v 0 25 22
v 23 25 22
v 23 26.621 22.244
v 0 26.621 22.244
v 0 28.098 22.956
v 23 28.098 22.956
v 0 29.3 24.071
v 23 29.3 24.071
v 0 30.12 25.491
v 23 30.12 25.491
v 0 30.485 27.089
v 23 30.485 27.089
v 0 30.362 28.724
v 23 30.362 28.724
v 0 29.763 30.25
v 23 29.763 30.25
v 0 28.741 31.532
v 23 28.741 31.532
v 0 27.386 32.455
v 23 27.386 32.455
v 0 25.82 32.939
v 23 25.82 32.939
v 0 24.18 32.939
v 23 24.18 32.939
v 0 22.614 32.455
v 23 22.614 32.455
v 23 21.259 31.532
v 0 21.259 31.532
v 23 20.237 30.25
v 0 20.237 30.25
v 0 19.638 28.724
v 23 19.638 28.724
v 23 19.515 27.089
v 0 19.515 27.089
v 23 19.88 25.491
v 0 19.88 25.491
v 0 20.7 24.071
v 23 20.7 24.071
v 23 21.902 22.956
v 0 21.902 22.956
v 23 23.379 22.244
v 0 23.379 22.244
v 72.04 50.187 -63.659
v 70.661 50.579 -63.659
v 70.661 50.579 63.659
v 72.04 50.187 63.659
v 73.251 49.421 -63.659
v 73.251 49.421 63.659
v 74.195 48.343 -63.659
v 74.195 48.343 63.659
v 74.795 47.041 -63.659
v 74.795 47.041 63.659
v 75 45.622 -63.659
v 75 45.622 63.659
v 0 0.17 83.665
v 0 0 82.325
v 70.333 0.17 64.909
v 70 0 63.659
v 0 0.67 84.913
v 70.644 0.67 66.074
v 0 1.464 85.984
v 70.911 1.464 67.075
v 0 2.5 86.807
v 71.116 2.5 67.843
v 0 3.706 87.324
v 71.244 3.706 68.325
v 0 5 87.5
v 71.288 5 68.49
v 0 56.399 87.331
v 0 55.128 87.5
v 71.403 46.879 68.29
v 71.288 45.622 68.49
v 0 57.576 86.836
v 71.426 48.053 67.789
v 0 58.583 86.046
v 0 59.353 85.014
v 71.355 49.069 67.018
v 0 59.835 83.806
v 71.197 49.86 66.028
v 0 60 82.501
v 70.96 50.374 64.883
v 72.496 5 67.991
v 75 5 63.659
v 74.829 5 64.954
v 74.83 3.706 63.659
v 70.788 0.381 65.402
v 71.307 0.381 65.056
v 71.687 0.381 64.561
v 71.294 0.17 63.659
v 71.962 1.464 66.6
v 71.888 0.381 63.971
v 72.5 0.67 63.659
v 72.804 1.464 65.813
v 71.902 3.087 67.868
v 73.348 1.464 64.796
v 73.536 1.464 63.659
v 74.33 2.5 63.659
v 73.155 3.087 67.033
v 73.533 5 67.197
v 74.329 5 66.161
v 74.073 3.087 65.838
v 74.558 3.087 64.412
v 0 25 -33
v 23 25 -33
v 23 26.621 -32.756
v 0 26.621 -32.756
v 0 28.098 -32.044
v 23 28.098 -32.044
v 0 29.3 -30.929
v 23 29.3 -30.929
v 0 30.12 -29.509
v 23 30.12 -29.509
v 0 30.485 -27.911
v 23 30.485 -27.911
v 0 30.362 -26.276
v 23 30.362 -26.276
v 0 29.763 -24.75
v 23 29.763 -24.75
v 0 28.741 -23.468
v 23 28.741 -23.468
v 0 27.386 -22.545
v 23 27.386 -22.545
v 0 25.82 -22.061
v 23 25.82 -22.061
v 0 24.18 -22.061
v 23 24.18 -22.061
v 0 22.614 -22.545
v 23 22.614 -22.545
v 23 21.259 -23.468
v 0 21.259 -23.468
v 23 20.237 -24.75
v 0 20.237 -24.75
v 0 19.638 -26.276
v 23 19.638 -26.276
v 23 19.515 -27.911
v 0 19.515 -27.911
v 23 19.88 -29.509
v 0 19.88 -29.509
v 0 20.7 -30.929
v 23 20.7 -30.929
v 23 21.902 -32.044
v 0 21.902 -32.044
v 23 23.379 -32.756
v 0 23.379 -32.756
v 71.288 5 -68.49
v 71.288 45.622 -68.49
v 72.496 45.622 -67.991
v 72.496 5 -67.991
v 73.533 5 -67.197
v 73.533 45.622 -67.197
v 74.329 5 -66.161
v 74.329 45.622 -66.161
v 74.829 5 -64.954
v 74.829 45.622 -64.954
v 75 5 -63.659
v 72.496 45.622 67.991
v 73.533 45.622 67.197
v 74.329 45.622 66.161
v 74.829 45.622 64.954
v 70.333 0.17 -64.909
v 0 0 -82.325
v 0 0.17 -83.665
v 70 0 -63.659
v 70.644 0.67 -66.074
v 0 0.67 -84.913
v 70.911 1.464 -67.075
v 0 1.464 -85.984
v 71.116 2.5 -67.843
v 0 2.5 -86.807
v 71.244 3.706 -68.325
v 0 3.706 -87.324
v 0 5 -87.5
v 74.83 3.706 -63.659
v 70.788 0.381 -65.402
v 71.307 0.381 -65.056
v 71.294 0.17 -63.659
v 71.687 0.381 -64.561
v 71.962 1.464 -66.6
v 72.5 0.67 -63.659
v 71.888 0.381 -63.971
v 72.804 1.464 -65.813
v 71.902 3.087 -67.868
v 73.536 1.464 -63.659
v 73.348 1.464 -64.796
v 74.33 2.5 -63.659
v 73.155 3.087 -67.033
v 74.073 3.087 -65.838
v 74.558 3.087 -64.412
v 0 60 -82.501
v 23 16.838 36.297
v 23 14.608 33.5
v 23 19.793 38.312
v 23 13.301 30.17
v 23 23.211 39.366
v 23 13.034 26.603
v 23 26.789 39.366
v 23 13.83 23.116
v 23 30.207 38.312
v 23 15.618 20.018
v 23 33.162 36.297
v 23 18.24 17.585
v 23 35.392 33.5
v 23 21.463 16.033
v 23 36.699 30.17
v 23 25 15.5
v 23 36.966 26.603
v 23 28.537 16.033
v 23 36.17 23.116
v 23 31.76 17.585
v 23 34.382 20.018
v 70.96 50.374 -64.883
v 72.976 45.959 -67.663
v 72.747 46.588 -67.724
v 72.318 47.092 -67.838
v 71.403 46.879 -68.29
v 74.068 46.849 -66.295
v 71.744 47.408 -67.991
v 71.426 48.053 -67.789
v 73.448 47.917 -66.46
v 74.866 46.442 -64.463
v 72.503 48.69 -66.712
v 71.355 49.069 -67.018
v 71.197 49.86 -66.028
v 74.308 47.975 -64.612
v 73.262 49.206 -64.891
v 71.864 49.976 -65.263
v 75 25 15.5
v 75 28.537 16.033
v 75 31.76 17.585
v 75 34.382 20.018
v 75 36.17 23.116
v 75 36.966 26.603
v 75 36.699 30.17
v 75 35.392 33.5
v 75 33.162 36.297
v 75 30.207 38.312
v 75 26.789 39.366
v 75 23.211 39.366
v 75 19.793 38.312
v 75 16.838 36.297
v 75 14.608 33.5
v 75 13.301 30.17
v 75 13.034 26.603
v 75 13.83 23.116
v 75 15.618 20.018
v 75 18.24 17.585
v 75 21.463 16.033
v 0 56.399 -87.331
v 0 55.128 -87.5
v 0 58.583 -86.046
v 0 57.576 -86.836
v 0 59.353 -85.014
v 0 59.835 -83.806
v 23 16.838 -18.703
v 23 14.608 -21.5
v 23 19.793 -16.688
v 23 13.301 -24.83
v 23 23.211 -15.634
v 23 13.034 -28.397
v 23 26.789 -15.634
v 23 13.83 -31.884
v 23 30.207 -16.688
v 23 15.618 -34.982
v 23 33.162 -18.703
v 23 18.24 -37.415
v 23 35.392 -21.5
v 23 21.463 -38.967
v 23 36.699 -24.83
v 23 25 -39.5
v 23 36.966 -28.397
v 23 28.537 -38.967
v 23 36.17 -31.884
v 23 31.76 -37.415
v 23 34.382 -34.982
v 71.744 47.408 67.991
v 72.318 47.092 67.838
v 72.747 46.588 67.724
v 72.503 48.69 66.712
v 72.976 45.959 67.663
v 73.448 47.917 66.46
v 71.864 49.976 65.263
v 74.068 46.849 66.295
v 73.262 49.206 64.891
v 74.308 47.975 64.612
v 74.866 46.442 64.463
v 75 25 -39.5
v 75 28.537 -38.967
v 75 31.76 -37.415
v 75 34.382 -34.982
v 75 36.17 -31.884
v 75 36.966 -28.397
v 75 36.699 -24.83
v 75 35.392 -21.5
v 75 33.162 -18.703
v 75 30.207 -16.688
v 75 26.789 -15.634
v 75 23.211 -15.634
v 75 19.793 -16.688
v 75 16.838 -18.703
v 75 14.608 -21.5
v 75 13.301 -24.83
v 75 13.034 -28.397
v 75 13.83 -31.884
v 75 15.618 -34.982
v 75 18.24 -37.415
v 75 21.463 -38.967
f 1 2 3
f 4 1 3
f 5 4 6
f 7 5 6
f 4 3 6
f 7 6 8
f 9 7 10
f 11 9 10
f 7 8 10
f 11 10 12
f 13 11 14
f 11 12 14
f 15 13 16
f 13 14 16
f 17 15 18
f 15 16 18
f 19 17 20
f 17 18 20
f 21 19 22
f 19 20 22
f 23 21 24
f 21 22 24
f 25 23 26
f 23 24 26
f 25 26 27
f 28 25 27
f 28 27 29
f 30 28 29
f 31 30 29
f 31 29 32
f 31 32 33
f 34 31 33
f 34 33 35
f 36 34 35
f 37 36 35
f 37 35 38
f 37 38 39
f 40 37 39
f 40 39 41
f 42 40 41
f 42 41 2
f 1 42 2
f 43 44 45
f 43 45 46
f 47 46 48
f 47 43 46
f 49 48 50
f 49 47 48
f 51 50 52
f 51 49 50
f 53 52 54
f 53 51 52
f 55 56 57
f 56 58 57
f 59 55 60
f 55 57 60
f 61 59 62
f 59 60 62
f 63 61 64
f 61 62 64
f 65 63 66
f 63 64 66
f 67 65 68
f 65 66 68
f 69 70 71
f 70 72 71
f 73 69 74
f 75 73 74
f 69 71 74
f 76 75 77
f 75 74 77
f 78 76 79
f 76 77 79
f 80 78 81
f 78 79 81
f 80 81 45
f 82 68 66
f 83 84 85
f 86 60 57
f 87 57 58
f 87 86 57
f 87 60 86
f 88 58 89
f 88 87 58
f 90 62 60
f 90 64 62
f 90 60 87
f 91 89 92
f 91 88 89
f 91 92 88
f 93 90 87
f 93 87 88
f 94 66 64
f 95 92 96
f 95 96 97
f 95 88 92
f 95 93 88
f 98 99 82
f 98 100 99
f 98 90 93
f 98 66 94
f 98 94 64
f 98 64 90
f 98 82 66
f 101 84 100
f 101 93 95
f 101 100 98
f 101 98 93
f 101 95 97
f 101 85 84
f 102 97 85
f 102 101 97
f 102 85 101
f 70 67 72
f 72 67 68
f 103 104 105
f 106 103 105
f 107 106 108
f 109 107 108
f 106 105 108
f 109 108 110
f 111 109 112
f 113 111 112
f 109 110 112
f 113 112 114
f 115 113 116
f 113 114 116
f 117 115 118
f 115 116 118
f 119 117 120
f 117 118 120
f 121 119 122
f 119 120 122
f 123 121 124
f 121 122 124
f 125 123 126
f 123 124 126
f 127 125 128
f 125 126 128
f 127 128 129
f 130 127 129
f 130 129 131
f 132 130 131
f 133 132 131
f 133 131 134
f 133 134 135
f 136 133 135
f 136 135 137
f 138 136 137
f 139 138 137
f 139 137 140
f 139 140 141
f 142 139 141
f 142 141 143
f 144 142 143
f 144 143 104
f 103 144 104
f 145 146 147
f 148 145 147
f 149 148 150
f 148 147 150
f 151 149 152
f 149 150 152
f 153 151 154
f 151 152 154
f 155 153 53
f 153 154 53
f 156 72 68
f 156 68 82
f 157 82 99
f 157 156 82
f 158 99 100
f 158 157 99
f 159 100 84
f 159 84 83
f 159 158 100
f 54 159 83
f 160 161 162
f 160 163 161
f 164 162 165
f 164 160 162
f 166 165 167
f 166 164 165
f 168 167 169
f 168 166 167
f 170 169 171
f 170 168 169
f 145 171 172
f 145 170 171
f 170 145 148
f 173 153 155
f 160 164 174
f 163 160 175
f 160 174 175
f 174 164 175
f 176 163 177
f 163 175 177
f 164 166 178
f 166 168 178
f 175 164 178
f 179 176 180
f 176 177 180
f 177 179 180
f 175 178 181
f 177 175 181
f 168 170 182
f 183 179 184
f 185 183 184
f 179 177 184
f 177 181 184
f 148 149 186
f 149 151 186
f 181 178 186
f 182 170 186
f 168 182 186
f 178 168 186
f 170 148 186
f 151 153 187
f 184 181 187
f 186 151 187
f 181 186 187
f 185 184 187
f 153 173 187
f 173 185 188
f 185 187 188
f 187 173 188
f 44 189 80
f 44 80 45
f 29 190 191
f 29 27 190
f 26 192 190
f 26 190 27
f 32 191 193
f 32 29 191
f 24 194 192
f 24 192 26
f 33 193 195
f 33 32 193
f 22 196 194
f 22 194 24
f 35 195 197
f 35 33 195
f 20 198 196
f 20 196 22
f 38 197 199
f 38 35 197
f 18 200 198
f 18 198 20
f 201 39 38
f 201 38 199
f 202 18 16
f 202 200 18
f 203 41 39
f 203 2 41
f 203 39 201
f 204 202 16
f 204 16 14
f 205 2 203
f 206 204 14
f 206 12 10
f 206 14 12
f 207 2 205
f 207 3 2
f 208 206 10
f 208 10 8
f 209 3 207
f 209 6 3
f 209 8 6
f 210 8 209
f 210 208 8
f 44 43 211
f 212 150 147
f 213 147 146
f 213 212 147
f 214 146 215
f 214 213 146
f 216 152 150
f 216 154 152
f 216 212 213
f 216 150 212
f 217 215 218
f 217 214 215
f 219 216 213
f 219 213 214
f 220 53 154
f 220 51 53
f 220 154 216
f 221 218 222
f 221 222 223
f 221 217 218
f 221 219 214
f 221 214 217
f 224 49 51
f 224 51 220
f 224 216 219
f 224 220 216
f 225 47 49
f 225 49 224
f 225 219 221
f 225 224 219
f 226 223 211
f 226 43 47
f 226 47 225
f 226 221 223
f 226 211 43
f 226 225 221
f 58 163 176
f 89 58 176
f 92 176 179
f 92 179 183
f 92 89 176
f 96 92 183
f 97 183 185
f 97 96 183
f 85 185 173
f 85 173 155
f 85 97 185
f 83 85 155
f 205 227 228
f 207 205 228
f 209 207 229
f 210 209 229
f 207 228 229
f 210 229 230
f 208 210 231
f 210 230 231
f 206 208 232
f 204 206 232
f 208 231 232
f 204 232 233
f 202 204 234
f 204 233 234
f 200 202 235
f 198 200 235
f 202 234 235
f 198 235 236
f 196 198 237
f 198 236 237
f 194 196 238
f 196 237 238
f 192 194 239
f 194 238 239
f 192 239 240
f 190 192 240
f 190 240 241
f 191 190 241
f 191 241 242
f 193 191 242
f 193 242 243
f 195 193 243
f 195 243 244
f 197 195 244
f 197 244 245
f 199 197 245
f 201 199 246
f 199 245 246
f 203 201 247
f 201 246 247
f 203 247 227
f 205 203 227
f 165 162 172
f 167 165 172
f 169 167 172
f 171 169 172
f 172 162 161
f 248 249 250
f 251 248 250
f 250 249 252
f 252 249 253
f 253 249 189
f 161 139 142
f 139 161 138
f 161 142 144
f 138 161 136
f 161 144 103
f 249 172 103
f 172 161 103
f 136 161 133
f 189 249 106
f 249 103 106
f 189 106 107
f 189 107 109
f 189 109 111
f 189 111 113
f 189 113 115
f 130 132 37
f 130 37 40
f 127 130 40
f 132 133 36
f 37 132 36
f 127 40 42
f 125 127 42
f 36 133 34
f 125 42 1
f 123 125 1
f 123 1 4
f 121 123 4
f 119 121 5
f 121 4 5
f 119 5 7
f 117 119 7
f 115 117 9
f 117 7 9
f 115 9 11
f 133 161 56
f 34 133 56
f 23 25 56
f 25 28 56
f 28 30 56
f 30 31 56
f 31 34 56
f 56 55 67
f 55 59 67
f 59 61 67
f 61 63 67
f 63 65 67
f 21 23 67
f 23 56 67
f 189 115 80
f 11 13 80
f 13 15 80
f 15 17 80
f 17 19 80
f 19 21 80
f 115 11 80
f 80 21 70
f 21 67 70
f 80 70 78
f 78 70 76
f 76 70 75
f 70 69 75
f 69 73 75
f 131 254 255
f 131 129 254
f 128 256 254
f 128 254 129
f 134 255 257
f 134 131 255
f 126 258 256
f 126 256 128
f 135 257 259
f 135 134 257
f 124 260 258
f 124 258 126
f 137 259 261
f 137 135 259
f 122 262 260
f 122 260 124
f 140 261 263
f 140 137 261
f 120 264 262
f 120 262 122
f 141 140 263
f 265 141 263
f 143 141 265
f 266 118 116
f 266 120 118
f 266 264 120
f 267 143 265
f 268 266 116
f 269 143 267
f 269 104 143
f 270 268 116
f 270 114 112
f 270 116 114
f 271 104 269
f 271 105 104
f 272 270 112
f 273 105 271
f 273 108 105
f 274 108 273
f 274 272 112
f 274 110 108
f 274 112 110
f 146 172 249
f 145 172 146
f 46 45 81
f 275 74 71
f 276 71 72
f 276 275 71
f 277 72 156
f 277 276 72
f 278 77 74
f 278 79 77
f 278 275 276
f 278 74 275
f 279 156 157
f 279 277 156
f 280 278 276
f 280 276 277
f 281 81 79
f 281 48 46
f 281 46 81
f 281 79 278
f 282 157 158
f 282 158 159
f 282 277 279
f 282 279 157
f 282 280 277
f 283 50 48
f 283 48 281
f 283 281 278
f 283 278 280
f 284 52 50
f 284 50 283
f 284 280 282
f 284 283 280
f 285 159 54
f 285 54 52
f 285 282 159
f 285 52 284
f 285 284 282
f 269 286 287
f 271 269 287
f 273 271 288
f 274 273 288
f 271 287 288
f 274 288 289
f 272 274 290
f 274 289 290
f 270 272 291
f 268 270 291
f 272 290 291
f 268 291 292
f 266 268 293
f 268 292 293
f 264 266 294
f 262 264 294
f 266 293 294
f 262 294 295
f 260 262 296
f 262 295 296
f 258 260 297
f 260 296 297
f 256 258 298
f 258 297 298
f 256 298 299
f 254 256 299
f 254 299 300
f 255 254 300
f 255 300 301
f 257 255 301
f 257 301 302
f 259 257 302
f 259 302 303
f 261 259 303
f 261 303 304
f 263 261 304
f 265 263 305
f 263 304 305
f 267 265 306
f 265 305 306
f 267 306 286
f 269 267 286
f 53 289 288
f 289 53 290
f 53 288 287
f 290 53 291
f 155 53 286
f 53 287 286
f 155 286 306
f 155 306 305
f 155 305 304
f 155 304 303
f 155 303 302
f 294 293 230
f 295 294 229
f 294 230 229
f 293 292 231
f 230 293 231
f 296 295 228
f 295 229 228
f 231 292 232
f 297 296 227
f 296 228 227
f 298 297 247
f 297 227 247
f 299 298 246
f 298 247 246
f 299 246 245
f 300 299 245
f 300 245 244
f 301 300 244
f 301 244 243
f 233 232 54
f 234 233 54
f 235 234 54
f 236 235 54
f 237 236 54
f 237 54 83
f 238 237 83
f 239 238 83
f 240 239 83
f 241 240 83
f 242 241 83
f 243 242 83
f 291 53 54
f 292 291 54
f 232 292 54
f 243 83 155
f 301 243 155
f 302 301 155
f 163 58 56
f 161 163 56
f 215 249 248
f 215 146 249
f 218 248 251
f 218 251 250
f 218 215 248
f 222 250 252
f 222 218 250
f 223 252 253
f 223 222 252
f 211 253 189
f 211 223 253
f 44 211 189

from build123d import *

# Parameters (mm, degrees)
EXTRUDE_1_DEPTH     = 87.5
CUT_EXTRUDE_1_DEPTH = 175
SKETCH_3_R          = 12
CUT_EXTRUDE_2_DEPTH = 52
SKETCH_4_R          = 5.5
CUT_EXTRUDE_3_DEPTH = 40
FILLET_1_R          = 5


with BuildPart() as part:
    # 草图1 → 凸台-拉伸1 (new, symmetric)
    with BuildSketch(Plane.XY):
        Polygon((0, 0), (0, 60), (75, 50), (75, 0), align=None)
    extrude(amount=EXTRUDE_1_DEPTH, both=True)

    # 草图2 → 切除-拉伸1 (cut)
    with BuildSketch(Plane.XZ):
        Polygon((0, 87.5), (75, 67.5), (75, 87.5), align=None)
        Polygon((0, -87.5), (75, -67.5), (75, -87.5), align=None)
    extrude(amount=-CUT_EXTRUDE_1_DEPTH, mode=Mode.SUBTRACT)

    # 草图3 → 切除-拉伸2 (cut)
    with BuildSketch(Plane(origin=(75, 0, 0), x_dir=(0, 0, -1), z_dir=(1, 0, 0))):
        with Locations((-27.5, 25)):
            Circle(SKETCH_3_R)
        with Locations((27.5, 25)):
            Circle(SKETCH_3_R)
    extrude(amount=-CUT_EXTRUDE_2_DEPTH, mode=Mode.SUBTRACT)

    # 草图4 → 切除-拉伸3 (cut)
    with BuildSketch(Plane(origin=(23, 0, 0), x_dir=(0, 0, -1), z_dir=(1, 0, 0))):
        with Locations((-27.5, 25)):
            Circle(SKETCH_4_R)
        with Locations((27.5, 25)):
            Circle(SKETCH_4_R)
    extrude(amount=-CUT_EXTRUDE_3_DEPTH, mode=Mode.SUBTRACT)

    # 圆角1
    fillet_1_edges = [part.edges().sort_by_distance(p)[0] for p in [
        (75, 50, 0),
        (75, 0, 0),
        (37.5, 55, 77.5),
        (75, 25, 67.5),
        (37.5, 0, 77.5),
        (75, 25, -67.5),
        (37.5, 55, -77.5),
        (37.5, 0, -77.5),
    ]]
    fillet(fillet_1_edges, radius=FILLET_1_R)


solid = part.part
